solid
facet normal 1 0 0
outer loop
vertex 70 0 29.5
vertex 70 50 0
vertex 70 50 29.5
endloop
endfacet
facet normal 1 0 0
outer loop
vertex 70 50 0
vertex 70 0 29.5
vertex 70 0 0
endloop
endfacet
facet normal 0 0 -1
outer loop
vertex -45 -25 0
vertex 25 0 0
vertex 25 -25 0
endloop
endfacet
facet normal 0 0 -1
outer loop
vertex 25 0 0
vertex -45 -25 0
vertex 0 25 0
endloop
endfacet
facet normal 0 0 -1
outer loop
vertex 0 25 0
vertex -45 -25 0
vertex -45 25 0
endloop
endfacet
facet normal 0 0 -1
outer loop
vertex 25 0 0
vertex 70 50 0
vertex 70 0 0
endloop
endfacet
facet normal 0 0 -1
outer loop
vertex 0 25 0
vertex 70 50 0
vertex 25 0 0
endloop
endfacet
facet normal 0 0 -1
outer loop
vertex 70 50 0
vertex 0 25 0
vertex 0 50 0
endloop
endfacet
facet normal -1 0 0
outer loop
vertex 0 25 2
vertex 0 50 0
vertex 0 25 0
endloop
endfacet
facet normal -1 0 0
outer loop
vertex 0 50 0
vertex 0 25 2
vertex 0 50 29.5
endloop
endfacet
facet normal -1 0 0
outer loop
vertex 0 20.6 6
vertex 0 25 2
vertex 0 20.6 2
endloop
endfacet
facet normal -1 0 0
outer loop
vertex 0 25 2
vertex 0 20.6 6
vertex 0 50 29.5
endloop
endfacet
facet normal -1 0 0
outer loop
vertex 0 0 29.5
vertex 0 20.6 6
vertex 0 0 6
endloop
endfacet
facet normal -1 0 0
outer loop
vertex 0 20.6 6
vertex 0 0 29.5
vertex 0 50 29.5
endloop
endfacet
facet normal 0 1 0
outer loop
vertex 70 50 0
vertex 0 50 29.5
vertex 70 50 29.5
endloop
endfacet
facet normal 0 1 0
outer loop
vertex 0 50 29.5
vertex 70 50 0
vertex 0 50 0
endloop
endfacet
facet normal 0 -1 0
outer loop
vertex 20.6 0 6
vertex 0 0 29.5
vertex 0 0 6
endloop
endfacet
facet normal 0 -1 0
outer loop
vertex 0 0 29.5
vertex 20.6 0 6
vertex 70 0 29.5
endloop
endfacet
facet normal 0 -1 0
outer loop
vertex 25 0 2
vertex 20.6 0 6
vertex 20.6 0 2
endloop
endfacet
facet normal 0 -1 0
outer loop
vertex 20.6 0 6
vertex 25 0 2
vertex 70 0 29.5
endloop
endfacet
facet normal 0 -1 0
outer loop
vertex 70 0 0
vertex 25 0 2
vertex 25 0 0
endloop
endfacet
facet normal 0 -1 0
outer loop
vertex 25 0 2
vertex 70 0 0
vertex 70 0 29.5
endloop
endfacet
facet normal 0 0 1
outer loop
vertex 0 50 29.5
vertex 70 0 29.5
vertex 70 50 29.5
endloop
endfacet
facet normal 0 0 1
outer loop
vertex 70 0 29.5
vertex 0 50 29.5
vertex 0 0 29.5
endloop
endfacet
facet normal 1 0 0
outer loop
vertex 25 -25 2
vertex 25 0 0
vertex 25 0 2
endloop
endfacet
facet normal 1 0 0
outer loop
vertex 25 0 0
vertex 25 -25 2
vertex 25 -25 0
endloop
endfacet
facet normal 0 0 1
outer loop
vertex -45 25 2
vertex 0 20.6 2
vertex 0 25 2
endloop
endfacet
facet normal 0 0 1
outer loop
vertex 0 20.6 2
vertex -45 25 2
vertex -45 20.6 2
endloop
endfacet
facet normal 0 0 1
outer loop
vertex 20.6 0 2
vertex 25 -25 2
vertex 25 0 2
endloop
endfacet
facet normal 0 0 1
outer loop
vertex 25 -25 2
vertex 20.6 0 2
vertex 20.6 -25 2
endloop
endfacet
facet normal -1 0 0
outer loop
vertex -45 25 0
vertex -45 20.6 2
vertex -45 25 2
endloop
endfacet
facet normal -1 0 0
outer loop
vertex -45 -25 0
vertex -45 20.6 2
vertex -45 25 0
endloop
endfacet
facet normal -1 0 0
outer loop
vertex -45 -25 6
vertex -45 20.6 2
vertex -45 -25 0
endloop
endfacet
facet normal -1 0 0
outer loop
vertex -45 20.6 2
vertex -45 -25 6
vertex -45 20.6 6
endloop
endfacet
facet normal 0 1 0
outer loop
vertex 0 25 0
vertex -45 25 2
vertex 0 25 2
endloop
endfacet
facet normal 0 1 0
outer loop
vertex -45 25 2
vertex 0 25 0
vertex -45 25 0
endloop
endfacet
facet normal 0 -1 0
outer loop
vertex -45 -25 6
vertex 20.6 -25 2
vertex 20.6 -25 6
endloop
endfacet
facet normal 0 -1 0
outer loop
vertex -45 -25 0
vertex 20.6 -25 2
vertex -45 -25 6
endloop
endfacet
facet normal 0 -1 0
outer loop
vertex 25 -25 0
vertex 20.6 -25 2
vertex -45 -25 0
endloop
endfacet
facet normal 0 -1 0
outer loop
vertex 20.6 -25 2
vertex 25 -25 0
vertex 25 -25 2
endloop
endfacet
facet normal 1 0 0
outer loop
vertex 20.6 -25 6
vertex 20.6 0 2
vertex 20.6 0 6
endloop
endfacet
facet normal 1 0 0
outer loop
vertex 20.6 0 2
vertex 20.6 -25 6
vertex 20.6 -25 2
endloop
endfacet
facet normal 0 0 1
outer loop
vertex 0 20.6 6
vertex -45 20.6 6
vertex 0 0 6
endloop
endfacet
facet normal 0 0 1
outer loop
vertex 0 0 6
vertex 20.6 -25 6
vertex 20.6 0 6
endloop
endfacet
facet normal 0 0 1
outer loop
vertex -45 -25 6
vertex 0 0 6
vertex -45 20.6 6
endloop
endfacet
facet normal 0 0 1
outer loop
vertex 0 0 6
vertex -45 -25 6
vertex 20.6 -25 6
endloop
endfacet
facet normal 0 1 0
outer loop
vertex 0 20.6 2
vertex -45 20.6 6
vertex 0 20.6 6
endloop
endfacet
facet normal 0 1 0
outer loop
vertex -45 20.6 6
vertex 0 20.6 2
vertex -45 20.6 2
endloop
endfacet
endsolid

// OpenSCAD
// Two-part enclosure for small electronics board (e.g. Arduino-based temperature logger)
// Print orientation: box upright, lid upside down (printed together, 10 mm gap)
// Units: mm

// ---------------- Parameters ----------------
box_x      = 70;    // box outer length (X)
box_y      = 50;    // box outer width (Y)
box_h      = 30;    // box outer height (Z)
wall       = 2;     // box wall thickness
floor      = 2;     // box floor thickness
eps        = 0.5;   // cutter overshoot past faces

lip_t      = 1.5;   // lip wall thickness
lip_h      = 4;     // lip height above plate
lip_x      = 65.6;  // lip outer length (X)
lip_y      = 45.6;  // lip outer width (Y)
clearance  = 0.2;   // side clearance between lip and box opening

plate_t    = 2;     // lid plate thickness
lip_over   = (lip_x - (box_x - 2 * wall)) / 2;  // lip extends past plate on +X
gap        = 10;    // gap between box and lid on the bed

$fn = 64;

// ---------------- Model ----------------
union() {
    // Box: open top, solid floor and walls
    difference() {
        cube([box_x, box_y, box_h]);
        // open the top face (but keep floor and walls)
        translate([0, 0, box_h - eps])
            cube([box_x + 2 * eps, box_y + 2 * eps, eps]);
    }

    // Lid: plate lying on the bed with a rectangular lip on the +X side
    translate([-box_x / 2 - gap, -box_y / 2, 0]) {
        union() {
            // base plate
            cube([box_x, box_y, plate_t]);

            // lip: a wall 1.5 mm thick and 4 mm tall, centred on the plate
            translate([0, 0, plate_t])
                cube([lip_x, lip_y, lip_h]);
        }
    }
}
